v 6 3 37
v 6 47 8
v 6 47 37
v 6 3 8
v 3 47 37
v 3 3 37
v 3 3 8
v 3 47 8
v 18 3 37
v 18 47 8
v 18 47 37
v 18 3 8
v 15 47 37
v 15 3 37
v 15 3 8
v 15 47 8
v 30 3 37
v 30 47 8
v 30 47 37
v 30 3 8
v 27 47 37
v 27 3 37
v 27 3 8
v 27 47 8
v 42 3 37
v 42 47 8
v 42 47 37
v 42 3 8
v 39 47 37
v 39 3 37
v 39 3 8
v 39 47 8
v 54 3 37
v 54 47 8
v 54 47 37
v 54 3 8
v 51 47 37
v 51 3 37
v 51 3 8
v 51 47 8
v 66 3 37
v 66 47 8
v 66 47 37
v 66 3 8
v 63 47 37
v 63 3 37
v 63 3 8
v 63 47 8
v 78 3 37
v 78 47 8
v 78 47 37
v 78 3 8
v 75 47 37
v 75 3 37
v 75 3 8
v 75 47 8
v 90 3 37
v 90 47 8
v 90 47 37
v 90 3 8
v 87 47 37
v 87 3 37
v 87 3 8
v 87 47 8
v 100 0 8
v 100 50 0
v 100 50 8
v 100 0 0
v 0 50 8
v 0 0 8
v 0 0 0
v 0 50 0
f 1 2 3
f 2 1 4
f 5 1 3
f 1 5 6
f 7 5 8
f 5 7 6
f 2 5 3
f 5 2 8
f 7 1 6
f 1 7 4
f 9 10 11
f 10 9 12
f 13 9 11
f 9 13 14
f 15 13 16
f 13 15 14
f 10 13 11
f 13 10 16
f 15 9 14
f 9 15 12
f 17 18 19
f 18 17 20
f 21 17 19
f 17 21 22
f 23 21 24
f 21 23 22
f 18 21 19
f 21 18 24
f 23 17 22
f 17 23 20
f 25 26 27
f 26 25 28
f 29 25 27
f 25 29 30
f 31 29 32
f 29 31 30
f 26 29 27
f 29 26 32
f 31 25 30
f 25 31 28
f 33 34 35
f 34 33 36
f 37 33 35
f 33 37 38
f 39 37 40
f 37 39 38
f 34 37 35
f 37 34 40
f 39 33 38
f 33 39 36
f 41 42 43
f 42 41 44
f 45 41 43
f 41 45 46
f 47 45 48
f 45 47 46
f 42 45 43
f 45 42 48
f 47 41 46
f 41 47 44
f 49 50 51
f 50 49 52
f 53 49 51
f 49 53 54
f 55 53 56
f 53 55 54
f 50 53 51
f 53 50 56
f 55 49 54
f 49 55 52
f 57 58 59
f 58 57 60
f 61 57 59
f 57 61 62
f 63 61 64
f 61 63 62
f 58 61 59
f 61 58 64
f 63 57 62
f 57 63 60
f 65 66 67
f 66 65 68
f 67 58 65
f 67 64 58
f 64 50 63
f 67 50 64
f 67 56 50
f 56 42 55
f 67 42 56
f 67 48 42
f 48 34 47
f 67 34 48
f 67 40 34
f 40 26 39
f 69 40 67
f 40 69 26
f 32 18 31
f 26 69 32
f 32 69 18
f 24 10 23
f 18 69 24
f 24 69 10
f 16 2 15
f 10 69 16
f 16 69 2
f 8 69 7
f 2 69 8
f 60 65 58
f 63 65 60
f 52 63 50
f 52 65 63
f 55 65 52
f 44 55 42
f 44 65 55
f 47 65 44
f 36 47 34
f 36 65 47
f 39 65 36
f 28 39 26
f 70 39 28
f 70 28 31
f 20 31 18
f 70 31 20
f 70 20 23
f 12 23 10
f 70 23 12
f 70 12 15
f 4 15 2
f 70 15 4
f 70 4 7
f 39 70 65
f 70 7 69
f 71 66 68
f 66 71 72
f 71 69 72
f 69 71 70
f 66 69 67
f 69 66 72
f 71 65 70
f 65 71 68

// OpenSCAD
$fn = 32;

// ----------------------------------------------------------------------
// Heatsink: uniform fin block
// ----------------------------------------------------------------------

// --- parameters (mm) ---
base_l = 100;             // base length, X
base_w = 50;              // base width, Y
base_t = 8;               // base plate thickness
fin_h = 30;               // fin height above the base
fin_t = 3;                // fin thickness
edge = 3;                 // margin from the base ends
pitch = 12;               // fin pitch

n_fins = floor((base_l - 2 * edge - fin_t) / pitch) + 1;  // fin count
total_h = base_t + fin_h - 1;  // overall height

union() {
  cube([base_l, base_w, base_t]);
  for (i = [0 : n_fins - 1])
    translate([edge + i * pitch, edge, base_t - 1])
      cube([fin_t, base_w - 2 * edge, fin_h]);
}
